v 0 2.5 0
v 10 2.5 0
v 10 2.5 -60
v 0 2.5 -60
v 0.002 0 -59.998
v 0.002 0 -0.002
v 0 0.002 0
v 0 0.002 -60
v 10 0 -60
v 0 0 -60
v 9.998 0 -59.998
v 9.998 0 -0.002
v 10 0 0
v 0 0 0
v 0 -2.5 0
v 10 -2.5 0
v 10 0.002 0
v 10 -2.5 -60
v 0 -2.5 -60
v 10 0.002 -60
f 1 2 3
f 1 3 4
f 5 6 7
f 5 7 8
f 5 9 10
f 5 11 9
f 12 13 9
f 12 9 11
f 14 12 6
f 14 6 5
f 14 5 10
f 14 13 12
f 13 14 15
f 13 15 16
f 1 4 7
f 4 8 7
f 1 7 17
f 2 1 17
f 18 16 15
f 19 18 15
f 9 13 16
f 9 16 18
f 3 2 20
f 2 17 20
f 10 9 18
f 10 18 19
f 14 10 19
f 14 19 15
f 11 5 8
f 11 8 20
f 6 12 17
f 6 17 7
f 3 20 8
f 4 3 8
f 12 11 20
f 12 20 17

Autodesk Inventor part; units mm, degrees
ref_plane "YZ Plane" through (0, 0, 0) normal (1, 0, 0) x (0, 1, 0)
ref_plane "XZ Plane" through (0, 0, 0) normal (0, 1, 0) x (-1, 0, 0)
ref_plane "XY Plane" through (0, 0, 0) normal (0, 0, 1) x (1, 0, 0)
sketch "Sketch1" plane through (0, 0, 0) normal (0, 1, 0) x (-1, 0, 0)
  line L0 (0, 0) -> (-10, 0)
  line L1 (-10, 0) -> (-10, -60)
  line L2 (-10, -60) -> (0, -60)
  line L3 (0, -60) -> (0, 0)
  dimension "d0" = 10
  dimension "d1" = 60
extrude "Extrusion1" add sketch "Sketch1" along normal blind 2.5
chamfer "Chamfer1" distance 0.002 angle 45 4 edges at (10, 0, -30) (5, 0, -60) (0, 0, -30) (5, 0, 0)
extrude "Extrusion2" add sketch "Sketch1" against normal blind 2.5
equation "\"d0\" = driveMagnet_width"
equation "\"d1\" = driveMagnet_length"
equation "\"d2\" = 0.5 * driveMagnet_height"
equation "\"d4\" = 0.5 * driveMagnet_height"
equation "\"gap\" = 0.1"
equation "\"airgap\" = 0.4"
equation "\"driveMagnet_length\" = 60"
equation "\"driveMagnet_width\" = 10"
equation "\"driveMagnet_height\" = 5"
equation "\"halbachMagnet_height\" = 3"
equation "\"sensorMagnet_diameter\" = 5"
equation "\"sensorMagnet_height\" = 2.66667"
equation "\"wallgap\" = 2"
equation "\"motorRadius\" = 2 * gap + driveMagnet_centerSpacingRadius + driveMagnet_length + 2 * wallgap"
equation "\"shaftDiameter\" = 8"
equation "\"flangeBearing_outerDiameter\" = 16"
equation "\"flangeBearing_innerDiameter\" = shaftDiameter"
equation "\"flangeBearing_height\" = 5"
equation "\"flangeBearing_flangeHeight\" = 1"
equation "\"flangeBearing_flangeDiameter\" = 18"
equation "\"magnetTrapNut_height\" = 1.2"
equation "\"magnetTrapNut_sideToSide\" = 4"
equation "\"magnetTrapBolt_headHeight\" = 2"
equation "\"magnetTrapBolt_headDiameter\" = 3.98"
equation "\"magnetTrapBolt_diameter\" = 2"
equation "\"statorThickness\" = coilThickness + 2 * wallgap"
equation "\"rotor_mountingLipHeight\" = 0.5 * statorThickness"
equation "\"magnetTrapHexNut_sideToSide\" = 4"
equation "\"magnetTrapSquareNut_sideLength\" = 4"
equation "\"magnetTrapSquareNut_height\" = 1.2"
equation "\"magnetTrapHexNut_height\" = 1.2"
equation "\"rotorRadius\" = 2 * gap + driveMagnet_centerSpacingRadius + driveMagnet_length + wallgap"
equation "\"rotorBandSquareNut_sideLength\" = 4"
equation "\"rotorBandHexNut_height\" = 1.2"
equation "\"rotorBandHexNut_sideToSide\" = 4"
equation "\"rotorBandSquareNut_height\" = 1.2"
equation "\"rotorBandBolt_headHeight\" = 2"
equation "\"rotorBandBolt_headDiameter\" = 3.98"
equation "\"rotorBandBolt_diameter\" = 2"
equation "\"rotorBandThickness\" = wallgap + rotorBandBolt_headHeight + gap"
equation "\"flangeCoupling_collarOuterDiameter\" = 16"
equation "\"flangeCoupling_flangeHoleEdgeToEdge\" = 2.05"
equation "\"flangeCoupling_innerDiameter\" = shaftDiameter"
equation "\"flangeCoupling_flangeHoleDiameter\" = 3.9"
equation "\"flangeCoupling_flangeHeight\" = 3.1"
equation "\"flangeCoupling_flangeDiameter\" = 32"
equation "\"flangeCoupling_height\" = flangeCoupling_collarHeight + flangeCoupling_flangeHeight"
equation "\"flangeCoupling_mountHoleDiameter\" = 3.9"
equation "\"flangeCoupling_mountHoleEdgeToEdge\" = 2.05"
equation "\"statorRadius\" = driveMagnet_length + driveMagnet_centerSpacingRadius + 2 * gap"
equation "\"coilThickness\" = 12"
equation "\"statorMountBolt_diameter\" = 4"
equation "\"statorMountBolt_headDiameter\" = 7"
equation "\"statorMountBolt_headHeight\" = 4"
equation "\"statorMountBolt_shaftLength\" = coilThickness + flangeCoupling_flangeHeight + wallgap"
equation "\"statorMountHexNut_height\" = 4"
equation "\"statorMountHexNut_sideToSide\" = 8"
equation "\"sensorMagnet_ringRadius\" = 0.5 * driveMagnet_centerSpacingRadius + 2 * wallgap"
equation "\"coil_percentCoverage\" = 0.6"
equation "\"statorSpokeDegrees\" = 4deg"
equation "\"coil_bulge\" = 3"
equation "\"statorCoilBolt_shaftLength\" = coilThickness"
equation "\"statorCoilHexNut_height\" = 1.2"
equation "\"statorCoilBolt_headHeight\" = 2"
equation "\"statorCoilBolt_diameter\" = 2"
equation "\"statorCoilBolt_headDiameter\" = 3.98"
equation "\"statorCoilHexNut_sideToSide\" = 4"
equation "\"driveMagnet_centerSpacingRadius\" = 38.96113"
equation "\"flangeCoupling_collarHeight\" = 10"
properties part number "DriveMagnet"
